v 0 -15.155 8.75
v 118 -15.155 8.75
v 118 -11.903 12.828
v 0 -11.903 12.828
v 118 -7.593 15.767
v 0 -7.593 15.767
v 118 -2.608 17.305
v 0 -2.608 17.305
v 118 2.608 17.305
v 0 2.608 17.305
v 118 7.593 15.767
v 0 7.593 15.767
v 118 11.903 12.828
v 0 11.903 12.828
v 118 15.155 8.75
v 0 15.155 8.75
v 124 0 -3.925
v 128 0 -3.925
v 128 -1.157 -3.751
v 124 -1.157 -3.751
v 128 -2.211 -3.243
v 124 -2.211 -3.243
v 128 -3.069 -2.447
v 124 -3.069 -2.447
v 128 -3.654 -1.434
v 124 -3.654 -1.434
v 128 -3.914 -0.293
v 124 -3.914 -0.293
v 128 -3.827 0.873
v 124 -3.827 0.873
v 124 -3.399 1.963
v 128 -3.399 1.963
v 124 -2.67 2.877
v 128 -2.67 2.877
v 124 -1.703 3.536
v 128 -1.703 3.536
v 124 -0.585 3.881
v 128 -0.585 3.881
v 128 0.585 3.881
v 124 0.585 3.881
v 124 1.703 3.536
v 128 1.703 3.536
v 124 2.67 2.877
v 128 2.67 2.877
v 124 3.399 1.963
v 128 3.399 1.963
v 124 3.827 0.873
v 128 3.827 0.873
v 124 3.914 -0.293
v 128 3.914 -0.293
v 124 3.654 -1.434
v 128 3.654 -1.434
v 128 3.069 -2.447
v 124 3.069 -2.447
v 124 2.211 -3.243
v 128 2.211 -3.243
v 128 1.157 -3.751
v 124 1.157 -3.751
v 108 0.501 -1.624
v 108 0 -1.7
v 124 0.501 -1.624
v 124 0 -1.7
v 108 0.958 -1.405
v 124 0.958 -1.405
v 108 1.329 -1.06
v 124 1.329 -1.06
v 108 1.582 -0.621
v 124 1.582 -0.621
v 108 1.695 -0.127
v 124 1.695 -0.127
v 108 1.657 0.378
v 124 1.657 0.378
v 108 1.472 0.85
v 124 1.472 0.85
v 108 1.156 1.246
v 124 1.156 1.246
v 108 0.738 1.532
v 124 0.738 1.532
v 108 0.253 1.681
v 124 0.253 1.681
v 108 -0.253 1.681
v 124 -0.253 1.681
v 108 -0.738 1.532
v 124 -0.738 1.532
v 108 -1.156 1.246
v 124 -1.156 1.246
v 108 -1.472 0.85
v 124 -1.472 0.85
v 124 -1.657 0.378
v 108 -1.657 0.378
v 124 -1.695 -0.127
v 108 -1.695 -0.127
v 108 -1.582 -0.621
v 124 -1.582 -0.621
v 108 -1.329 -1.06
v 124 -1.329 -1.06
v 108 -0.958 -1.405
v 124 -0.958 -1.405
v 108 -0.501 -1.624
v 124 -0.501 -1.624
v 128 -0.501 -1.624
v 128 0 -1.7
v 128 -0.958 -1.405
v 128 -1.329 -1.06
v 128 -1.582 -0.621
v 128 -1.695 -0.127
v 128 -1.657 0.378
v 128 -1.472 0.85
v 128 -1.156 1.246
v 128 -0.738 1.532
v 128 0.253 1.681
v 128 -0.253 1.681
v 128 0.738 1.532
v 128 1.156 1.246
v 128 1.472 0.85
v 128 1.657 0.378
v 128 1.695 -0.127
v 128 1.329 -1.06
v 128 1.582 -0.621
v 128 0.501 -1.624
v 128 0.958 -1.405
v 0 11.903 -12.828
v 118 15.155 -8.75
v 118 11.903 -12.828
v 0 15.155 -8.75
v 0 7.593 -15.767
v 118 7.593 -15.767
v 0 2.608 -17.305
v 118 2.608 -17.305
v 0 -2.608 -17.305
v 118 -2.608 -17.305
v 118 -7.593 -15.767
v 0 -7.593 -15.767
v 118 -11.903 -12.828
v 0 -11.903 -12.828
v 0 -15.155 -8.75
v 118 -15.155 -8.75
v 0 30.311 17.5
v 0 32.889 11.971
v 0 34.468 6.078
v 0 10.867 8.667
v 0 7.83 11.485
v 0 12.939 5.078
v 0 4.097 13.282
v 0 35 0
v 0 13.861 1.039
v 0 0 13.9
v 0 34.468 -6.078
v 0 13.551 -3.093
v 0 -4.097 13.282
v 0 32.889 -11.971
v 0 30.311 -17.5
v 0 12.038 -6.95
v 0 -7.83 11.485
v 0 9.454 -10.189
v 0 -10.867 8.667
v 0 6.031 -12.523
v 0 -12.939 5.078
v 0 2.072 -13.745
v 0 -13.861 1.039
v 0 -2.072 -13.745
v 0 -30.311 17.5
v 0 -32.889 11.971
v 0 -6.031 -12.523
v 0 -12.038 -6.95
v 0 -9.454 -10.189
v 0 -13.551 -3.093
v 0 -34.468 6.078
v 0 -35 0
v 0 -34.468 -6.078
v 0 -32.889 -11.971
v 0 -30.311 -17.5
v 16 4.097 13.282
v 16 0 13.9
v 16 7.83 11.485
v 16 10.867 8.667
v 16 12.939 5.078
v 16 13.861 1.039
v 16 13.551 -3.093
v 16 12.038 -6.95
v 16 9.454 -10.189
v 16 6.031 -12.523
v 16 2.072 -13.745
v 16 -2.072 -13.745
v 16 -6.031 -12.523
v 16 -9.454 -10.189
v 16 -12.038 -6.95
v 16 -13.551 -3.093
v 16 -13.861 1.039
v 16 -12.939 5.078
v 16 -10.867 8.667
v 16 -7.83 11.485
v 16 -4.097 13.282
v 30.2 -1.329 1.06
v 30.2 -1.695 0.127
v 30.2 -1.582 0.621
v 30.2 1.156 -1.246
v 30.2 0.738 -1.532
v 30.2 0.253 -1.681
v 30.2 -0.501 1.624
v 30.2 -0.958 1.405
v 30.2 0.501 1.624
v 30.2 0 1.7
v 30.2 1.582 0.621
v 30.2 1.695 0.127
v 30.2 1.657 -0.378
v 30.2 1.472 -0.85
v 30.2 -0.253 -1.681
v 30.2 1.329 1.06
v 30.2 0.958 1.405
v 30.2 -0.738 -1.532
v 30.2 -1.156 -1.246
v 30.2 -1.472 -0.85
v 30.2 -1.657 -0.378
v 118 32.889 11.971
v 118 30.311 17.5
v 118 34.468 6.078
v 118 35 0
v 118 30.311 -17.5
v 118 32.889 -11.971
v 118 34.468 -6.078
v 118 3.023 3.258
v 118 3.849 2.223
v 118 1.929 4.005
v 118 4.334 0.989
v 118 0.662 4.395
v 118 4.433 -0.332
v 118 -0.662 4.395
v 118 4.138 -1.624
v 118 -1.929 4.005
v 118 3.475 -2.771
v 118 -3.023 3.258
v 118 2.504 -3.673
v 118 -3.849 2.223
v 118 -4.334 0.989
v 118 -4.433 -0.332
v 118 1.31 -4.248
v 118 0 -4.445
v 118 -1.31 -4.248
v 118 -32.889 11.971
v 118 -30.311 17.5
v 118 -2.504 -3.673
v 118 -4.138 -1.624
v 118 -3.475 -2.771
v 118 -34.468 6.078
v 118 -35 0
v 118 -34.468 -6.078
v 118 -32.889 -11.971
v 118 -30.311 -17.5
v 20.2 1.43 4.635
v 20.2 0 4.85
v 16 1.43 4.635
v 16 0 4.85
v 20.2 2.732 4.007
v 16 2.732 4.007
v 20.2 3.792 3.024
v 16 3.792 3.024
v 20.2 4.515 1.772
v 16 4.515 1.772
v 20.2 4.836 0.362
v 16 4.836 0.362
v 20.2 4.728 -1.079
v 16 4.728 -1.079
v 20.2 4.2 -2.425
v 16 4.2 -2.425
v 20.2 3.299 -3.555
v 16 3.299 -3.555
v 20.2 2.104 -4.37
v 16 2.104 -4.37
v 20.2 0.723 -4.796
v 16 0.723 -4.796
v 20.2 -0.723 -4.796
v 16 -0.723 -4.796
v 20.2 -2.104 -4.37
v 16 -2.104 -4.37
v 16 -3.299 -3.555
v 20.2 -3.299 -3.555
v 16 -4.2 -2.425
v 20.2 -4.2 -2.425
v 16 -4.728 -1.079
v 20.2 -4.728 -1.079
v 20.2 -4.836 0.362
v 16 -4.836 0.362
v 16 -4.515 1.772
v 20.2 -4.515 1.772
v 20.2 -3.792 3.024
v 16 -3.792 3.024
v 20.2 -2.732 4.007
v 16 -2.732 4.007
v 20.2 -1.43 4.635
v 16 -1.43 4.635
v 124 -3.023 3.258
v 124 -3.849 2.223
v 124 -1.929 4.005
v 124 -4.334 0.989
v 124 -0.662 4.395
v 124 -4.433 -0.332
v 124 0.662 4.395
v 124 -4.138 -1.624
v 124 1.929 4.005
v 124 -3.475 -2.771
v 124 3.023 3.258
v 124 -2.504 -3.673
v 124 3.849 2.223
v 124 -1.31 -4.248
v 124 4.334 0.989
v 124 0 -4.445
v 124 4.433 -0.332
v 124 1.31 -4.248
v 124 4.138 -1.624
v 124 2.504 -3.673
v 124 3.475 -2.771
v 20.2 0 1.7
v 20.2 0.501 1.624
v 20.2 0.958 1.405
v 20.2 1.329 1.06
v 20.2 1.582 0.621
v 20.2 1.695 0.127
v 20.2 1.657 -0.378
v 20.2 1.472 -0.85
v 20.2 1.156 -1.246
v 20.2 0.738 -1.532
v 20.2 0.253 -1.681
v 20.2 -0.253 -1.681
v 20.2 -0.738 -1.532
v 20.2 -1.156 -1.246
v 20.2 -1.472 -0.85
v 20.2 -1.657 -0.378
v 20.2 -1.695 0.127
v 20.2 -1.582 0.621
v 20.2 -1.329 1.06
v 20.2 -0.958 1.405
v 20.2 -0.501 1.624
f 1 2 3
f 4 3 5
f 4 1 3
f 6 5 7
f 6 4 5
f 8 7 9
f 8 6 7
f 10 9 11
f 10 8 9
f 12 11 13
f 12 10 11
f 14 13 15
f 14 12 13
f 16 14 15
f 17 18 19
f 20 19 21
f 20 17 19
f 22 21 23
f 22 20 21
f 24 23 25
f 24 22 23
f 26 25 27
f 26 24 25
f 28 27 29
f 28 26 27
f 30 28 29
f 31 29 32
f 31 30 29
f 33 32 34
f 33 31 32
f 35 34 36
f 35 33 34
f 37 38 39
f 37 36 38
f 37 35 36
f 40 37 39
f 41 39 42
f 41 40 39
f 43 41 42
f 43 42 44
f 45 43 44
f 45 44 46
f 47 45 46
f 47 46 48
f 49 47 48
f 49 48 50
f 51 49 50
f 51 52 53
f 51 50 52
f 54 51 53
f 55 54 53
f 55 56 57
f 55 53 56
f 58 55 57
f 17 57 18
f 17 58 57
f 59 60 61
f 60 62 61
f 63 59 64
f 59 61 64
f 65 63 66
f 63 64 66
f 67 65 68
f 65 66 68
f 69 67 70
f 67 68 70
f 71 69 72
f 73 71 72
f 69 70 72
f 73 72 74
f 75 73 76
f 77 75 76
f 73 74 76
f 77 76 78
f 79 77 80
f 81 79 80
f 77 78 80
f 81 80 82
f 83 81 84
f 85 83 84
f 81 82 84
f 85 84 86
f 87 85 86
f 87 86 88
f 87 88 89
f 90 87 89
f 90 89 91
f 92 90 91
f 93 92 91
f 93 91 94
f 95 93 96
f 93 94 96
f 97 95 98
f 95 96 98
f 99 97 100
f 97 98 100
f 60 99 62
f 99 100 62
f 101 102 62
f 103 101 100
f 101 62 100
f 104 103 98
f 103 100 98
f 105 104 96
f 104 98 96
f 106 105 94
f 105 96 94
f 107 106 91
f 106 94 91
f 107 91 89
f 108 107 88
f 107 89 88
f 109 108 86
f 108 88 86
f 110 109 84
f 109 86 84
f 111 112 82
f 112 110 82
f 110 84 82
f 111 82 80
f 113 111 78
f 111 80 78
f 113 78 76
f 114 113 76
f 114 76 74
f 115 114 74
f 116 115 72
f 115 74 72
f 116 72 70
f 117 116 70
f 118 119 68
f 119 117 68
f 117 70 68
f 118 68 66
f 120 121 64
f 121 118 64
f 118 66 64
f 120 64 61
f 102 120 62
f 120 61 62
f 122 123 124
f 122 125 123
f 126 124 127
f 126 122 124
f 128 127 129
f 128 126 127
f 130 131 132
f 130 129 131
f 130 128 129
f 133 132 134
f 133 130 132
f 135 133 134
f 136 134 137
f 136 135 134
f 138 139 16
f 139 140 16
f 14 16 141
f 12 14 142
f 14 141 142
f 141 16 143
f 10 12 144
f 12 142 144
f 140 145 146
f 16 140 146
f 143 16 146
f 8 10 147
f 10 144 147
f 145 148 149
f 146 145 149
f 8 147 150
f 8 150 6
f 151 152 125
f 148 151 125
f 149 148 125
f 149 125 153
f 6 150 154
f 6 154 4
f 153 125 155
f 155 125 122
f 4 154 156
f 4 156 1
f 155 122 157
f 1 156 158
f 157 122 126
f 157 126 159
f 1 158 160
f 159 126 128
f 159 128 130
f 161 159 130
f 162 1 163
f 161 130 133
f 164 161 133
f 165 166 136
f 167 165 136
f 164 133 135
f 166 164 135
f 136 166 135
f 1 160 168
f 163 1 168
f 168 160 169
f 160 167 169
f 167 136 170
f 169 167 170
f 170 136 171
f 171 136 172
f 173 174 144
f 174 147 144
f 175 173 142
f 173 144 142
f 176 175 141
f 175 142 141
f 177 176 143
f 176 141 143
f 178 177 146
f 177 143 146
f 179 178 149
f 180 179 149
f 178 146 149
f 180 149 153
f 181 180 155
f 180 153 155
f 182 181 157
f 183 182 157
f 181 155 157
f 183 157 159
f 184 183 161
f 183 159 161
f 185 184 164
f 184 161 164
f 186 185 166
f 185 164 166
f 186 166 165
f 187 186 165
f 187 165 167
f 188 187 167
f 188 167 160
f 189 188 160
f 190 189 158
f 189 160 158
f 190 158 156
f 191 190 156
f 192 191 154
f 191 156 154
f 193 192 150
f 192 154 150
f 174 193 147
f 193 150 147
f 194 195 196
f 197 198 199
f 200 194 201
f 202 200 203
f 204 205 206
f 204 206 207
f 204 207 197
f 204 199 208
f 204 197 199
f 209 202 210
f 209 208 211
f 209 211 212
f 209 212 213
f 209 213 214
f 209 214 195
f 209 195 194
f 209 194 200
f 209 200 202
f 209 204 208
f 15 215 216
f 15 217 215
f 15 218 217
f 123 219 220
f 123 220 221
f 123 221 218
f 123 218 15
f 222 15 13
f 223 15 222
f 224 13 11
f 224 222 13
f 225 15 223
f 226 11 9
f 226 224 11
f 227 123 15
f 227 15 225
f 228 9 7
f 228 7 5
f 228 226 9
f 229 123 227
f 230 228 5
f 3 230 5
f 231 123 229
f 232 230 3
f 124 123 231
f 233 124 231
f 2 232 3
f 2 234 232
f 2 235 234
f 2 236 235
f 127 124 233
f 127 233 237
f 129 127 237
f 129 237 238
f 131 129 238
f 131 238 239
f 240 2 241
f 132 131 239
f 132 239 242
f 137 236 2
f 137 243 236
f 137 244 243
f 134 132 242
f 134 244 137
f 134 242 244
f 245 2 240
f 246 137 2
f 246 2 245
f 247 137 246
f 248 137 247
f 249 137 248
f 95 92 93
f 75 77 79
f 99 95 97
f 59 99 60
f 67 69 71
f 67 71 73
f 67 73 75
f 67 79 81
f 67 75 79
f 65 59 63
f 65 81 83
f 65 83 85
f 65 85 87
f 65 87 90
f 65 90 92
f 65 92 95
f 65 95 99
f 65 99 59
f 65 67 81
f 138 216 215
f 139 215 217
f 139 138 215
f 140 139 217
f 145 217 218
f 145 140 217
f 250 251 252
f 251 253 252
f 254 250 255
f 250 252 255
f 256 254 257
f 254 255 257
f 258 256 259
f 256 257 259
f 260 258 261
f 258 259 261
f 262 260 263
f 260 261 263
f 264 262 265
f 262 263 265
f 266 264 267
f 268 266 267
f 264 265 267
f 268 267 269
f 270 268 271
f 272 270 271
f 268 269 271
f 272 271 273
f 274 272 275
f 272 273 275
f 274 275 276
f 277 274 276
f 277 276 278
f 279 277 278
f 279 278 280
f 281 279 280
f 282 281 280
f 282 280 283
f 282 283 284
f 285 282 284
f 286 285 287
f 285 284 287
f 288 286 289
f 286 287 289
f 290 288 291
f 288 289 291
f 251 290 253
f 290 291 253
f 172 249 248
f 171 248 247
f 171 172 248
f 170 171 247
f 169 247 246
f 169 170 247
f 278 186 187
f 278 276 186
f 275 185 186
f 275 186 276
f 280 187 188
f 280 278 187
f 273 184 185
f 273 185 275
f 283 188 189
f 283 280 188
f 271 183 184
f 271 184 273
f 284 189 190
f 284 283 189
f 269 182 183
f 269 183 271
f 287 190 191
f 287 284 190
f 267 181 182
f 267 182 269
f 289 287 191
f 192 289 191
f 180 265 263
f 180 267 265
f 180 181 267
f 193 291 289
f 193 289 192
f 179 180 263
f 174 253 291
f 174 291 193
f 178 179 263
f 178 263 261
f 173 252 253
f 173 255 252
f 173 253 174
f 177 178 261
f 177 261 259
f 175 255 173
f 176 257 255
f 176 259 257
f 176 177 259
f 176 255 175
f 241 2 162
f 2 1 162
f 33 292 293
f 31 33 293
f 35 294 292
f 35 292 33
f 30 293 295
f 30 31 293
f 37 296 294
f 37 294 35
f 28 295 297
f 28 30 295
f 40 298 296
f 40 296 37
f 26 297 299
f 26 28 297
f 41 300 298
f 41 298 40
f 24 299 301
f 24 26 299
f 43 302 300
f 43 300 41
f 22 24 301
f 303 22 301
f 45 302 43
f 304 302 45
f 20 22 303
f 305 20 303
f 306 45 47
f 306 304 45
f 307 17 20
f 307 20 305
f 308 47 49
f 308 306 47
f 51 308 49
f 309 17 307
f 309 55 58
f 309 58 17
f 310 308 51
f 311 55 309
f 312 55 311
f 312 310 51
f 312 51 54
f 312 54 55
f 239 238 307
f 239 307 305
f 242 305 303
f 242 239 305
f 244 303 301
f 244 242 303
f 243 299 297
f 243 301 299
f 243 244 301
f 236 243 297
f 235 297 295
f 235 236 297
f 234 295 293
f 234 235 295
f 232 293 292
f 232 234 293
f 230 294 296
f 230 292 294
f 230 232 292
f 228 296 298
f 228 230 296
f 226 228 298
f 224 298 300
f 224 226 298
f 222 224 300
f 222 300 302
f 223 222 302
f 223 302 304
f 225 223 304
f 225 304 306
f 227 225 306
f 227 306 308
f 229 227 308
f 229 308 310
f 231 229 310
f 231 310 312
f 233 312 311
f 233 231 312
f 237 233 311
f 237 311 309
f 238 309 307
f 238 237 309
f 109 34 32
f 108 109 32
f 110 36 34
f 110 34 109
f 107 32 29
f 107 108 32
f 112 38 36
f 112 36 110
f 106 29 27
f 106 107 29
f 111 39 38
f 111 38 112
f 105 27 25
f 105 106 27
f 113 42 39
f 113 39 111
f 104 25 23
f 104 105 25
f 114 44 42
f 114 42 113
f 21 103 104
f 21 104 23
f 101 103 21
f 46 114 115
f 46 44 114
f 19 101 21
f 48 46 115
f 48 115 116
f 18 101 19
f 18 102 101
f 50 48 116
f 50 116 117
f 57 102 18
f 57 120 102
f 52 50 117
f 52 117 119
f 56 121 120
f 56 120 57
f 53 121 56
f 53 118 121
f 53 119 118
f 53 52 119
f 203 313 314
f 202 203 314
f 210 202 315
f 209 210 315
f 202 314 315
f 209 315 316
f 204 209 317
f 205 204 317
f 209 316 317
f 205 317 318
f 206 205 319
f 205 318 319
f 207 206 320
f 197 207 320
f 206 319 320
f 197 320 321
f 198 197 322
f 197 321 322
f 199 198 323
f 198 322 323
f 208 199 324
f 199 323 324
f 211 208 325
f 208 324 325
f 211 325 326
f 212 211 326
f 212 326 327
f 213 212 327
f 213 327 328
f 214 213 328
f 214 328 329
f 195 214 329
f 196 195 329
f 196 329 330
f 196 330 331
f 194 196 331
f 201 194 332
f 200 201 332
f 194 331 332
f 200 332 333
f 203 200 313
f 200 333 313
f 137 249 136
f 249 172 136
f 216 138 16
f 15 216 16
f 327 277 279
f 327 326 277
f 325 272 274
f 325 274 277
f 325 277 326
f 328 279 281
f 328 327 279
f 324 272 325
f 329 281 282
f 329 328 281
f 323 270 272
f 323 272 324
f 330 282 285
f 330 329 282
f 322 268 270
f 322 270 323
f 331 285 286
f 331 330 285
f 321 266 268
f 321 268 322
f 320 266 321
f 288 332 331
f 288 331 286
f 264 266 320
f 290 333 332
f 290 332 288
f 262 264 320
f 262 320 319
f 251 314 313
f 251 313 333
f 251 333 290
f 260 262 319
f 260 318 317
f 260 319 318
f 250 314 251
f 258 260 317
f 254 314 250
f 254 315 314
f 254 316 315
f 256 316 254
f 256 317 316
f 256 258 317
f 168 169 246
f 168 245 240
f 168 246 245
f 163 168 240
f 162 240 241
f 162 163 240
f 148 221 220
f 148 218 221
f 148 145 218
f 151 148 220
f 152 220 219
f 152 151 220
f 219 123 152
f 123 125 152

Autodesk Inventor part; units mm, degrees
ref_plane "YZ Plane" through (0, 0, 0) normal (1, 0, 0) x (0, 1, 0)
ref_plane "XZ Plane" through (0, 0, 0) normal (0, 1, 0) x (-1, 0, 0)
ref_plane "XY Plane" through (0, 0, 0) normal (0, 0, 1) x (1, 0, 0)
sketch "Sketch1" plane through (0, 0, 0) normal (1, 0, 0) x (0, 1, 0)
  circle A0 centre (0, 0) radius 17.5
  dimension "d1" = 35
extrude "Extrusion1" add sketch "Sketch1" along normal blind 118
sketch "Sketch2" plane through (0, 0, 0) normal (-1, 0, 0) x (0, 0, 1)
  circle A0 centre (0, 0) radius 13.9
  dimension "d4" = 27.8
extrude "Extrusion2" cut sketch "Sketch2" against normal blind 16
sketch "Sketch3" plane through (16, 0, 0) normal (-1, 0, 0) x (0, 0, 1)
  circle A0 centre (0, 0) radius 4.85
  dimension "d7" = 9.7
extrude "Extrusion3" cut sketch "Sketch3" against normal blind 4.2
sketch "Sketch4" plane through (20.2, 0, 0) normal (-1, 0, 0) x (0, 0, 1)
  circle A0 centre (0, 0) radius 1.7
  dimension "d10" = 3.4
extrude "Extrusion4" cut sketch "Sketch4" against normal blind 10
sketch "Sketch9" plane through (0, 0, 0) normal (1, 0, 0) x (0, 1, 0)
  circle A0 centre (0, 0) radius 1.7 construction
  circle A1 centre (0, 0) radius 35 construction
  line L0 (-35, 0) -> (-17.5, 0)
  circle A2 centre (0, 0) radius 17.5 construction
  line L1 (-15.1554, 8.75) -> (-30.3109, 17.5)
  arc A3 (-30.3109, 17.5) -> (-35, 0) centre (0, 0) ccw
  arc A4 (-15.1554, 8.75) -> (-17.5, 0) centre (0, 0) ccw
  dimension "d32" = 70
  dimension "d33" = 30
extrude "Extrusion8" add sketch "Sketch9" along normal up to surface (118 mm away)
sketch "Sketch10" plane through (118, 0, 0) normal (1, 0, 0) x (0, 0, -1)
  circle A0 centre (0, 0) radius 1.7 projected
  circle A1 centre (0, 0) radius 3.925
  dimension "d36" = 7.85
extrude "Extrusion9" add sketch "Sketch10" along normal blind 10
sketch "Sketch12" plane through (118, 0, 0) normal (1, 0, 0) x (0, 0, -1)
  circle A0 centre (0, 0) radius 4.445
  dimension "d42" = 8.89
extrude "Extrusion11" add sketch "Sketch12" along normal blind 6
sketch "Sketch11" plane through (118, 0, 0) normal (1, 0, 0) x (0, 0, -1)
  circle A0 centre (0, 0) radius 4.85 projected
  circle A1 centre (0, 0) radius 1.7
extrude "Extrusion10" cut sketch "Sketch11" against normal blind 20 from surface at 10 contours A1
mirror "Mirror1" about plane through (0, 0, 0) normal (0, 0, 1) of "Extrusion8"
mirror "Mirror2" about plane through (0, 0, 0) normal (0, 1, 0) of "Extrusion8", "Mirror1"
properties part number "newDrum_3DPrint"
